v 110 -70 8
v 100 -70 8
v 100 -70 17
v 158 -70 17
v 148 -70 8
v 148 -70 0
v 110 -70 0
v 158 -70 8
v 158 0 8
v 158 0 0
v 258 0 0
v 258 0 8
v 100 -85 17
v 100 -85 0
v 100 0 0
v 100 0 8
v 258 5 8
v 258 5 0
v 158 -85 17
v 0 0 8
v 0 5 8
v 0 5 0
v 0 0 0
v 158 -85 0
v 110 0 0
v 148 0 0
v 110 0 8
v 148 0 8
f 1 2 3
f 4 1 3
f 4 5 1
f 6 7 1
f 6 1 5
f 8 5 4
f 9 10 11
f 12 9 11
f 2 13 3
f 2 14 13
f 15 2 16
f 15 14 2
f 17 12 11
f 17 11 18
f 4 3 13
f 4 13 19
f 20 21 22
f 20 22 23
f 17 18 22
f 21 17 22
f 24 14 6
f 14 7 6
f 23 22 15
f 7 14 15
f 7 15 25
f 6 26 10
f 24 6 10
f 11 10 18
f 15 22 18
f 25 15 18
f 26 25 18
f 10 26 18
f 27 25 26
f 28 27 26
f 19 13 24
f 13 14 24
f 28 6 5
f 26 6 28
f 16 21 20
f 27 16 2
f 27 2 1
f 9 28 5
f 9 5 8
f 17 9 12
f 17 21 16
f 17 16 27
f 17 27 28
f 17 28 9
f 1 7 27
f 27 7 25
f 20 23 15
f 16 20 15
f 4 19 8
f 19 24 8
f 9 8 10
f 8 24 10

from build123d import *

# Parameters (mm, degrees)
SKETCH_W     = 38
SKETCH_H     = 70
PAD_DEPTH    = 8
SKETCH001_W  = 58
SKETCH001_H  = 15
PAD001_DEPTH = 9


with BuildPart() as part:
    # Sketch → Pad (new body)
    with BuildSketch(Plane.XY):
        Polygon((258, 0), (258, 5), (0, 5), (0, 0), (100, 0), (100, -85), (110, -85), (148, -85), (158, -85), (158, 0), align=None)
        with Locations((129, -35)):
            Rectangle(SKETCH_W, SKETCH_H, mode=Mode.SUBTRACT)
    extrude(amount=PAD_DEPTH)

    # Sketch001 (on Face16 of Pad) → Pad001 (join)
    with BuildSketch(Plane.XY.offset(8)):
        with Locations((129, -77.5)):
            Rectangle(SKETCH001_W, SKETCH001_H)
    extrude(amount=PAD001_DEPTH)


solid = part.part
